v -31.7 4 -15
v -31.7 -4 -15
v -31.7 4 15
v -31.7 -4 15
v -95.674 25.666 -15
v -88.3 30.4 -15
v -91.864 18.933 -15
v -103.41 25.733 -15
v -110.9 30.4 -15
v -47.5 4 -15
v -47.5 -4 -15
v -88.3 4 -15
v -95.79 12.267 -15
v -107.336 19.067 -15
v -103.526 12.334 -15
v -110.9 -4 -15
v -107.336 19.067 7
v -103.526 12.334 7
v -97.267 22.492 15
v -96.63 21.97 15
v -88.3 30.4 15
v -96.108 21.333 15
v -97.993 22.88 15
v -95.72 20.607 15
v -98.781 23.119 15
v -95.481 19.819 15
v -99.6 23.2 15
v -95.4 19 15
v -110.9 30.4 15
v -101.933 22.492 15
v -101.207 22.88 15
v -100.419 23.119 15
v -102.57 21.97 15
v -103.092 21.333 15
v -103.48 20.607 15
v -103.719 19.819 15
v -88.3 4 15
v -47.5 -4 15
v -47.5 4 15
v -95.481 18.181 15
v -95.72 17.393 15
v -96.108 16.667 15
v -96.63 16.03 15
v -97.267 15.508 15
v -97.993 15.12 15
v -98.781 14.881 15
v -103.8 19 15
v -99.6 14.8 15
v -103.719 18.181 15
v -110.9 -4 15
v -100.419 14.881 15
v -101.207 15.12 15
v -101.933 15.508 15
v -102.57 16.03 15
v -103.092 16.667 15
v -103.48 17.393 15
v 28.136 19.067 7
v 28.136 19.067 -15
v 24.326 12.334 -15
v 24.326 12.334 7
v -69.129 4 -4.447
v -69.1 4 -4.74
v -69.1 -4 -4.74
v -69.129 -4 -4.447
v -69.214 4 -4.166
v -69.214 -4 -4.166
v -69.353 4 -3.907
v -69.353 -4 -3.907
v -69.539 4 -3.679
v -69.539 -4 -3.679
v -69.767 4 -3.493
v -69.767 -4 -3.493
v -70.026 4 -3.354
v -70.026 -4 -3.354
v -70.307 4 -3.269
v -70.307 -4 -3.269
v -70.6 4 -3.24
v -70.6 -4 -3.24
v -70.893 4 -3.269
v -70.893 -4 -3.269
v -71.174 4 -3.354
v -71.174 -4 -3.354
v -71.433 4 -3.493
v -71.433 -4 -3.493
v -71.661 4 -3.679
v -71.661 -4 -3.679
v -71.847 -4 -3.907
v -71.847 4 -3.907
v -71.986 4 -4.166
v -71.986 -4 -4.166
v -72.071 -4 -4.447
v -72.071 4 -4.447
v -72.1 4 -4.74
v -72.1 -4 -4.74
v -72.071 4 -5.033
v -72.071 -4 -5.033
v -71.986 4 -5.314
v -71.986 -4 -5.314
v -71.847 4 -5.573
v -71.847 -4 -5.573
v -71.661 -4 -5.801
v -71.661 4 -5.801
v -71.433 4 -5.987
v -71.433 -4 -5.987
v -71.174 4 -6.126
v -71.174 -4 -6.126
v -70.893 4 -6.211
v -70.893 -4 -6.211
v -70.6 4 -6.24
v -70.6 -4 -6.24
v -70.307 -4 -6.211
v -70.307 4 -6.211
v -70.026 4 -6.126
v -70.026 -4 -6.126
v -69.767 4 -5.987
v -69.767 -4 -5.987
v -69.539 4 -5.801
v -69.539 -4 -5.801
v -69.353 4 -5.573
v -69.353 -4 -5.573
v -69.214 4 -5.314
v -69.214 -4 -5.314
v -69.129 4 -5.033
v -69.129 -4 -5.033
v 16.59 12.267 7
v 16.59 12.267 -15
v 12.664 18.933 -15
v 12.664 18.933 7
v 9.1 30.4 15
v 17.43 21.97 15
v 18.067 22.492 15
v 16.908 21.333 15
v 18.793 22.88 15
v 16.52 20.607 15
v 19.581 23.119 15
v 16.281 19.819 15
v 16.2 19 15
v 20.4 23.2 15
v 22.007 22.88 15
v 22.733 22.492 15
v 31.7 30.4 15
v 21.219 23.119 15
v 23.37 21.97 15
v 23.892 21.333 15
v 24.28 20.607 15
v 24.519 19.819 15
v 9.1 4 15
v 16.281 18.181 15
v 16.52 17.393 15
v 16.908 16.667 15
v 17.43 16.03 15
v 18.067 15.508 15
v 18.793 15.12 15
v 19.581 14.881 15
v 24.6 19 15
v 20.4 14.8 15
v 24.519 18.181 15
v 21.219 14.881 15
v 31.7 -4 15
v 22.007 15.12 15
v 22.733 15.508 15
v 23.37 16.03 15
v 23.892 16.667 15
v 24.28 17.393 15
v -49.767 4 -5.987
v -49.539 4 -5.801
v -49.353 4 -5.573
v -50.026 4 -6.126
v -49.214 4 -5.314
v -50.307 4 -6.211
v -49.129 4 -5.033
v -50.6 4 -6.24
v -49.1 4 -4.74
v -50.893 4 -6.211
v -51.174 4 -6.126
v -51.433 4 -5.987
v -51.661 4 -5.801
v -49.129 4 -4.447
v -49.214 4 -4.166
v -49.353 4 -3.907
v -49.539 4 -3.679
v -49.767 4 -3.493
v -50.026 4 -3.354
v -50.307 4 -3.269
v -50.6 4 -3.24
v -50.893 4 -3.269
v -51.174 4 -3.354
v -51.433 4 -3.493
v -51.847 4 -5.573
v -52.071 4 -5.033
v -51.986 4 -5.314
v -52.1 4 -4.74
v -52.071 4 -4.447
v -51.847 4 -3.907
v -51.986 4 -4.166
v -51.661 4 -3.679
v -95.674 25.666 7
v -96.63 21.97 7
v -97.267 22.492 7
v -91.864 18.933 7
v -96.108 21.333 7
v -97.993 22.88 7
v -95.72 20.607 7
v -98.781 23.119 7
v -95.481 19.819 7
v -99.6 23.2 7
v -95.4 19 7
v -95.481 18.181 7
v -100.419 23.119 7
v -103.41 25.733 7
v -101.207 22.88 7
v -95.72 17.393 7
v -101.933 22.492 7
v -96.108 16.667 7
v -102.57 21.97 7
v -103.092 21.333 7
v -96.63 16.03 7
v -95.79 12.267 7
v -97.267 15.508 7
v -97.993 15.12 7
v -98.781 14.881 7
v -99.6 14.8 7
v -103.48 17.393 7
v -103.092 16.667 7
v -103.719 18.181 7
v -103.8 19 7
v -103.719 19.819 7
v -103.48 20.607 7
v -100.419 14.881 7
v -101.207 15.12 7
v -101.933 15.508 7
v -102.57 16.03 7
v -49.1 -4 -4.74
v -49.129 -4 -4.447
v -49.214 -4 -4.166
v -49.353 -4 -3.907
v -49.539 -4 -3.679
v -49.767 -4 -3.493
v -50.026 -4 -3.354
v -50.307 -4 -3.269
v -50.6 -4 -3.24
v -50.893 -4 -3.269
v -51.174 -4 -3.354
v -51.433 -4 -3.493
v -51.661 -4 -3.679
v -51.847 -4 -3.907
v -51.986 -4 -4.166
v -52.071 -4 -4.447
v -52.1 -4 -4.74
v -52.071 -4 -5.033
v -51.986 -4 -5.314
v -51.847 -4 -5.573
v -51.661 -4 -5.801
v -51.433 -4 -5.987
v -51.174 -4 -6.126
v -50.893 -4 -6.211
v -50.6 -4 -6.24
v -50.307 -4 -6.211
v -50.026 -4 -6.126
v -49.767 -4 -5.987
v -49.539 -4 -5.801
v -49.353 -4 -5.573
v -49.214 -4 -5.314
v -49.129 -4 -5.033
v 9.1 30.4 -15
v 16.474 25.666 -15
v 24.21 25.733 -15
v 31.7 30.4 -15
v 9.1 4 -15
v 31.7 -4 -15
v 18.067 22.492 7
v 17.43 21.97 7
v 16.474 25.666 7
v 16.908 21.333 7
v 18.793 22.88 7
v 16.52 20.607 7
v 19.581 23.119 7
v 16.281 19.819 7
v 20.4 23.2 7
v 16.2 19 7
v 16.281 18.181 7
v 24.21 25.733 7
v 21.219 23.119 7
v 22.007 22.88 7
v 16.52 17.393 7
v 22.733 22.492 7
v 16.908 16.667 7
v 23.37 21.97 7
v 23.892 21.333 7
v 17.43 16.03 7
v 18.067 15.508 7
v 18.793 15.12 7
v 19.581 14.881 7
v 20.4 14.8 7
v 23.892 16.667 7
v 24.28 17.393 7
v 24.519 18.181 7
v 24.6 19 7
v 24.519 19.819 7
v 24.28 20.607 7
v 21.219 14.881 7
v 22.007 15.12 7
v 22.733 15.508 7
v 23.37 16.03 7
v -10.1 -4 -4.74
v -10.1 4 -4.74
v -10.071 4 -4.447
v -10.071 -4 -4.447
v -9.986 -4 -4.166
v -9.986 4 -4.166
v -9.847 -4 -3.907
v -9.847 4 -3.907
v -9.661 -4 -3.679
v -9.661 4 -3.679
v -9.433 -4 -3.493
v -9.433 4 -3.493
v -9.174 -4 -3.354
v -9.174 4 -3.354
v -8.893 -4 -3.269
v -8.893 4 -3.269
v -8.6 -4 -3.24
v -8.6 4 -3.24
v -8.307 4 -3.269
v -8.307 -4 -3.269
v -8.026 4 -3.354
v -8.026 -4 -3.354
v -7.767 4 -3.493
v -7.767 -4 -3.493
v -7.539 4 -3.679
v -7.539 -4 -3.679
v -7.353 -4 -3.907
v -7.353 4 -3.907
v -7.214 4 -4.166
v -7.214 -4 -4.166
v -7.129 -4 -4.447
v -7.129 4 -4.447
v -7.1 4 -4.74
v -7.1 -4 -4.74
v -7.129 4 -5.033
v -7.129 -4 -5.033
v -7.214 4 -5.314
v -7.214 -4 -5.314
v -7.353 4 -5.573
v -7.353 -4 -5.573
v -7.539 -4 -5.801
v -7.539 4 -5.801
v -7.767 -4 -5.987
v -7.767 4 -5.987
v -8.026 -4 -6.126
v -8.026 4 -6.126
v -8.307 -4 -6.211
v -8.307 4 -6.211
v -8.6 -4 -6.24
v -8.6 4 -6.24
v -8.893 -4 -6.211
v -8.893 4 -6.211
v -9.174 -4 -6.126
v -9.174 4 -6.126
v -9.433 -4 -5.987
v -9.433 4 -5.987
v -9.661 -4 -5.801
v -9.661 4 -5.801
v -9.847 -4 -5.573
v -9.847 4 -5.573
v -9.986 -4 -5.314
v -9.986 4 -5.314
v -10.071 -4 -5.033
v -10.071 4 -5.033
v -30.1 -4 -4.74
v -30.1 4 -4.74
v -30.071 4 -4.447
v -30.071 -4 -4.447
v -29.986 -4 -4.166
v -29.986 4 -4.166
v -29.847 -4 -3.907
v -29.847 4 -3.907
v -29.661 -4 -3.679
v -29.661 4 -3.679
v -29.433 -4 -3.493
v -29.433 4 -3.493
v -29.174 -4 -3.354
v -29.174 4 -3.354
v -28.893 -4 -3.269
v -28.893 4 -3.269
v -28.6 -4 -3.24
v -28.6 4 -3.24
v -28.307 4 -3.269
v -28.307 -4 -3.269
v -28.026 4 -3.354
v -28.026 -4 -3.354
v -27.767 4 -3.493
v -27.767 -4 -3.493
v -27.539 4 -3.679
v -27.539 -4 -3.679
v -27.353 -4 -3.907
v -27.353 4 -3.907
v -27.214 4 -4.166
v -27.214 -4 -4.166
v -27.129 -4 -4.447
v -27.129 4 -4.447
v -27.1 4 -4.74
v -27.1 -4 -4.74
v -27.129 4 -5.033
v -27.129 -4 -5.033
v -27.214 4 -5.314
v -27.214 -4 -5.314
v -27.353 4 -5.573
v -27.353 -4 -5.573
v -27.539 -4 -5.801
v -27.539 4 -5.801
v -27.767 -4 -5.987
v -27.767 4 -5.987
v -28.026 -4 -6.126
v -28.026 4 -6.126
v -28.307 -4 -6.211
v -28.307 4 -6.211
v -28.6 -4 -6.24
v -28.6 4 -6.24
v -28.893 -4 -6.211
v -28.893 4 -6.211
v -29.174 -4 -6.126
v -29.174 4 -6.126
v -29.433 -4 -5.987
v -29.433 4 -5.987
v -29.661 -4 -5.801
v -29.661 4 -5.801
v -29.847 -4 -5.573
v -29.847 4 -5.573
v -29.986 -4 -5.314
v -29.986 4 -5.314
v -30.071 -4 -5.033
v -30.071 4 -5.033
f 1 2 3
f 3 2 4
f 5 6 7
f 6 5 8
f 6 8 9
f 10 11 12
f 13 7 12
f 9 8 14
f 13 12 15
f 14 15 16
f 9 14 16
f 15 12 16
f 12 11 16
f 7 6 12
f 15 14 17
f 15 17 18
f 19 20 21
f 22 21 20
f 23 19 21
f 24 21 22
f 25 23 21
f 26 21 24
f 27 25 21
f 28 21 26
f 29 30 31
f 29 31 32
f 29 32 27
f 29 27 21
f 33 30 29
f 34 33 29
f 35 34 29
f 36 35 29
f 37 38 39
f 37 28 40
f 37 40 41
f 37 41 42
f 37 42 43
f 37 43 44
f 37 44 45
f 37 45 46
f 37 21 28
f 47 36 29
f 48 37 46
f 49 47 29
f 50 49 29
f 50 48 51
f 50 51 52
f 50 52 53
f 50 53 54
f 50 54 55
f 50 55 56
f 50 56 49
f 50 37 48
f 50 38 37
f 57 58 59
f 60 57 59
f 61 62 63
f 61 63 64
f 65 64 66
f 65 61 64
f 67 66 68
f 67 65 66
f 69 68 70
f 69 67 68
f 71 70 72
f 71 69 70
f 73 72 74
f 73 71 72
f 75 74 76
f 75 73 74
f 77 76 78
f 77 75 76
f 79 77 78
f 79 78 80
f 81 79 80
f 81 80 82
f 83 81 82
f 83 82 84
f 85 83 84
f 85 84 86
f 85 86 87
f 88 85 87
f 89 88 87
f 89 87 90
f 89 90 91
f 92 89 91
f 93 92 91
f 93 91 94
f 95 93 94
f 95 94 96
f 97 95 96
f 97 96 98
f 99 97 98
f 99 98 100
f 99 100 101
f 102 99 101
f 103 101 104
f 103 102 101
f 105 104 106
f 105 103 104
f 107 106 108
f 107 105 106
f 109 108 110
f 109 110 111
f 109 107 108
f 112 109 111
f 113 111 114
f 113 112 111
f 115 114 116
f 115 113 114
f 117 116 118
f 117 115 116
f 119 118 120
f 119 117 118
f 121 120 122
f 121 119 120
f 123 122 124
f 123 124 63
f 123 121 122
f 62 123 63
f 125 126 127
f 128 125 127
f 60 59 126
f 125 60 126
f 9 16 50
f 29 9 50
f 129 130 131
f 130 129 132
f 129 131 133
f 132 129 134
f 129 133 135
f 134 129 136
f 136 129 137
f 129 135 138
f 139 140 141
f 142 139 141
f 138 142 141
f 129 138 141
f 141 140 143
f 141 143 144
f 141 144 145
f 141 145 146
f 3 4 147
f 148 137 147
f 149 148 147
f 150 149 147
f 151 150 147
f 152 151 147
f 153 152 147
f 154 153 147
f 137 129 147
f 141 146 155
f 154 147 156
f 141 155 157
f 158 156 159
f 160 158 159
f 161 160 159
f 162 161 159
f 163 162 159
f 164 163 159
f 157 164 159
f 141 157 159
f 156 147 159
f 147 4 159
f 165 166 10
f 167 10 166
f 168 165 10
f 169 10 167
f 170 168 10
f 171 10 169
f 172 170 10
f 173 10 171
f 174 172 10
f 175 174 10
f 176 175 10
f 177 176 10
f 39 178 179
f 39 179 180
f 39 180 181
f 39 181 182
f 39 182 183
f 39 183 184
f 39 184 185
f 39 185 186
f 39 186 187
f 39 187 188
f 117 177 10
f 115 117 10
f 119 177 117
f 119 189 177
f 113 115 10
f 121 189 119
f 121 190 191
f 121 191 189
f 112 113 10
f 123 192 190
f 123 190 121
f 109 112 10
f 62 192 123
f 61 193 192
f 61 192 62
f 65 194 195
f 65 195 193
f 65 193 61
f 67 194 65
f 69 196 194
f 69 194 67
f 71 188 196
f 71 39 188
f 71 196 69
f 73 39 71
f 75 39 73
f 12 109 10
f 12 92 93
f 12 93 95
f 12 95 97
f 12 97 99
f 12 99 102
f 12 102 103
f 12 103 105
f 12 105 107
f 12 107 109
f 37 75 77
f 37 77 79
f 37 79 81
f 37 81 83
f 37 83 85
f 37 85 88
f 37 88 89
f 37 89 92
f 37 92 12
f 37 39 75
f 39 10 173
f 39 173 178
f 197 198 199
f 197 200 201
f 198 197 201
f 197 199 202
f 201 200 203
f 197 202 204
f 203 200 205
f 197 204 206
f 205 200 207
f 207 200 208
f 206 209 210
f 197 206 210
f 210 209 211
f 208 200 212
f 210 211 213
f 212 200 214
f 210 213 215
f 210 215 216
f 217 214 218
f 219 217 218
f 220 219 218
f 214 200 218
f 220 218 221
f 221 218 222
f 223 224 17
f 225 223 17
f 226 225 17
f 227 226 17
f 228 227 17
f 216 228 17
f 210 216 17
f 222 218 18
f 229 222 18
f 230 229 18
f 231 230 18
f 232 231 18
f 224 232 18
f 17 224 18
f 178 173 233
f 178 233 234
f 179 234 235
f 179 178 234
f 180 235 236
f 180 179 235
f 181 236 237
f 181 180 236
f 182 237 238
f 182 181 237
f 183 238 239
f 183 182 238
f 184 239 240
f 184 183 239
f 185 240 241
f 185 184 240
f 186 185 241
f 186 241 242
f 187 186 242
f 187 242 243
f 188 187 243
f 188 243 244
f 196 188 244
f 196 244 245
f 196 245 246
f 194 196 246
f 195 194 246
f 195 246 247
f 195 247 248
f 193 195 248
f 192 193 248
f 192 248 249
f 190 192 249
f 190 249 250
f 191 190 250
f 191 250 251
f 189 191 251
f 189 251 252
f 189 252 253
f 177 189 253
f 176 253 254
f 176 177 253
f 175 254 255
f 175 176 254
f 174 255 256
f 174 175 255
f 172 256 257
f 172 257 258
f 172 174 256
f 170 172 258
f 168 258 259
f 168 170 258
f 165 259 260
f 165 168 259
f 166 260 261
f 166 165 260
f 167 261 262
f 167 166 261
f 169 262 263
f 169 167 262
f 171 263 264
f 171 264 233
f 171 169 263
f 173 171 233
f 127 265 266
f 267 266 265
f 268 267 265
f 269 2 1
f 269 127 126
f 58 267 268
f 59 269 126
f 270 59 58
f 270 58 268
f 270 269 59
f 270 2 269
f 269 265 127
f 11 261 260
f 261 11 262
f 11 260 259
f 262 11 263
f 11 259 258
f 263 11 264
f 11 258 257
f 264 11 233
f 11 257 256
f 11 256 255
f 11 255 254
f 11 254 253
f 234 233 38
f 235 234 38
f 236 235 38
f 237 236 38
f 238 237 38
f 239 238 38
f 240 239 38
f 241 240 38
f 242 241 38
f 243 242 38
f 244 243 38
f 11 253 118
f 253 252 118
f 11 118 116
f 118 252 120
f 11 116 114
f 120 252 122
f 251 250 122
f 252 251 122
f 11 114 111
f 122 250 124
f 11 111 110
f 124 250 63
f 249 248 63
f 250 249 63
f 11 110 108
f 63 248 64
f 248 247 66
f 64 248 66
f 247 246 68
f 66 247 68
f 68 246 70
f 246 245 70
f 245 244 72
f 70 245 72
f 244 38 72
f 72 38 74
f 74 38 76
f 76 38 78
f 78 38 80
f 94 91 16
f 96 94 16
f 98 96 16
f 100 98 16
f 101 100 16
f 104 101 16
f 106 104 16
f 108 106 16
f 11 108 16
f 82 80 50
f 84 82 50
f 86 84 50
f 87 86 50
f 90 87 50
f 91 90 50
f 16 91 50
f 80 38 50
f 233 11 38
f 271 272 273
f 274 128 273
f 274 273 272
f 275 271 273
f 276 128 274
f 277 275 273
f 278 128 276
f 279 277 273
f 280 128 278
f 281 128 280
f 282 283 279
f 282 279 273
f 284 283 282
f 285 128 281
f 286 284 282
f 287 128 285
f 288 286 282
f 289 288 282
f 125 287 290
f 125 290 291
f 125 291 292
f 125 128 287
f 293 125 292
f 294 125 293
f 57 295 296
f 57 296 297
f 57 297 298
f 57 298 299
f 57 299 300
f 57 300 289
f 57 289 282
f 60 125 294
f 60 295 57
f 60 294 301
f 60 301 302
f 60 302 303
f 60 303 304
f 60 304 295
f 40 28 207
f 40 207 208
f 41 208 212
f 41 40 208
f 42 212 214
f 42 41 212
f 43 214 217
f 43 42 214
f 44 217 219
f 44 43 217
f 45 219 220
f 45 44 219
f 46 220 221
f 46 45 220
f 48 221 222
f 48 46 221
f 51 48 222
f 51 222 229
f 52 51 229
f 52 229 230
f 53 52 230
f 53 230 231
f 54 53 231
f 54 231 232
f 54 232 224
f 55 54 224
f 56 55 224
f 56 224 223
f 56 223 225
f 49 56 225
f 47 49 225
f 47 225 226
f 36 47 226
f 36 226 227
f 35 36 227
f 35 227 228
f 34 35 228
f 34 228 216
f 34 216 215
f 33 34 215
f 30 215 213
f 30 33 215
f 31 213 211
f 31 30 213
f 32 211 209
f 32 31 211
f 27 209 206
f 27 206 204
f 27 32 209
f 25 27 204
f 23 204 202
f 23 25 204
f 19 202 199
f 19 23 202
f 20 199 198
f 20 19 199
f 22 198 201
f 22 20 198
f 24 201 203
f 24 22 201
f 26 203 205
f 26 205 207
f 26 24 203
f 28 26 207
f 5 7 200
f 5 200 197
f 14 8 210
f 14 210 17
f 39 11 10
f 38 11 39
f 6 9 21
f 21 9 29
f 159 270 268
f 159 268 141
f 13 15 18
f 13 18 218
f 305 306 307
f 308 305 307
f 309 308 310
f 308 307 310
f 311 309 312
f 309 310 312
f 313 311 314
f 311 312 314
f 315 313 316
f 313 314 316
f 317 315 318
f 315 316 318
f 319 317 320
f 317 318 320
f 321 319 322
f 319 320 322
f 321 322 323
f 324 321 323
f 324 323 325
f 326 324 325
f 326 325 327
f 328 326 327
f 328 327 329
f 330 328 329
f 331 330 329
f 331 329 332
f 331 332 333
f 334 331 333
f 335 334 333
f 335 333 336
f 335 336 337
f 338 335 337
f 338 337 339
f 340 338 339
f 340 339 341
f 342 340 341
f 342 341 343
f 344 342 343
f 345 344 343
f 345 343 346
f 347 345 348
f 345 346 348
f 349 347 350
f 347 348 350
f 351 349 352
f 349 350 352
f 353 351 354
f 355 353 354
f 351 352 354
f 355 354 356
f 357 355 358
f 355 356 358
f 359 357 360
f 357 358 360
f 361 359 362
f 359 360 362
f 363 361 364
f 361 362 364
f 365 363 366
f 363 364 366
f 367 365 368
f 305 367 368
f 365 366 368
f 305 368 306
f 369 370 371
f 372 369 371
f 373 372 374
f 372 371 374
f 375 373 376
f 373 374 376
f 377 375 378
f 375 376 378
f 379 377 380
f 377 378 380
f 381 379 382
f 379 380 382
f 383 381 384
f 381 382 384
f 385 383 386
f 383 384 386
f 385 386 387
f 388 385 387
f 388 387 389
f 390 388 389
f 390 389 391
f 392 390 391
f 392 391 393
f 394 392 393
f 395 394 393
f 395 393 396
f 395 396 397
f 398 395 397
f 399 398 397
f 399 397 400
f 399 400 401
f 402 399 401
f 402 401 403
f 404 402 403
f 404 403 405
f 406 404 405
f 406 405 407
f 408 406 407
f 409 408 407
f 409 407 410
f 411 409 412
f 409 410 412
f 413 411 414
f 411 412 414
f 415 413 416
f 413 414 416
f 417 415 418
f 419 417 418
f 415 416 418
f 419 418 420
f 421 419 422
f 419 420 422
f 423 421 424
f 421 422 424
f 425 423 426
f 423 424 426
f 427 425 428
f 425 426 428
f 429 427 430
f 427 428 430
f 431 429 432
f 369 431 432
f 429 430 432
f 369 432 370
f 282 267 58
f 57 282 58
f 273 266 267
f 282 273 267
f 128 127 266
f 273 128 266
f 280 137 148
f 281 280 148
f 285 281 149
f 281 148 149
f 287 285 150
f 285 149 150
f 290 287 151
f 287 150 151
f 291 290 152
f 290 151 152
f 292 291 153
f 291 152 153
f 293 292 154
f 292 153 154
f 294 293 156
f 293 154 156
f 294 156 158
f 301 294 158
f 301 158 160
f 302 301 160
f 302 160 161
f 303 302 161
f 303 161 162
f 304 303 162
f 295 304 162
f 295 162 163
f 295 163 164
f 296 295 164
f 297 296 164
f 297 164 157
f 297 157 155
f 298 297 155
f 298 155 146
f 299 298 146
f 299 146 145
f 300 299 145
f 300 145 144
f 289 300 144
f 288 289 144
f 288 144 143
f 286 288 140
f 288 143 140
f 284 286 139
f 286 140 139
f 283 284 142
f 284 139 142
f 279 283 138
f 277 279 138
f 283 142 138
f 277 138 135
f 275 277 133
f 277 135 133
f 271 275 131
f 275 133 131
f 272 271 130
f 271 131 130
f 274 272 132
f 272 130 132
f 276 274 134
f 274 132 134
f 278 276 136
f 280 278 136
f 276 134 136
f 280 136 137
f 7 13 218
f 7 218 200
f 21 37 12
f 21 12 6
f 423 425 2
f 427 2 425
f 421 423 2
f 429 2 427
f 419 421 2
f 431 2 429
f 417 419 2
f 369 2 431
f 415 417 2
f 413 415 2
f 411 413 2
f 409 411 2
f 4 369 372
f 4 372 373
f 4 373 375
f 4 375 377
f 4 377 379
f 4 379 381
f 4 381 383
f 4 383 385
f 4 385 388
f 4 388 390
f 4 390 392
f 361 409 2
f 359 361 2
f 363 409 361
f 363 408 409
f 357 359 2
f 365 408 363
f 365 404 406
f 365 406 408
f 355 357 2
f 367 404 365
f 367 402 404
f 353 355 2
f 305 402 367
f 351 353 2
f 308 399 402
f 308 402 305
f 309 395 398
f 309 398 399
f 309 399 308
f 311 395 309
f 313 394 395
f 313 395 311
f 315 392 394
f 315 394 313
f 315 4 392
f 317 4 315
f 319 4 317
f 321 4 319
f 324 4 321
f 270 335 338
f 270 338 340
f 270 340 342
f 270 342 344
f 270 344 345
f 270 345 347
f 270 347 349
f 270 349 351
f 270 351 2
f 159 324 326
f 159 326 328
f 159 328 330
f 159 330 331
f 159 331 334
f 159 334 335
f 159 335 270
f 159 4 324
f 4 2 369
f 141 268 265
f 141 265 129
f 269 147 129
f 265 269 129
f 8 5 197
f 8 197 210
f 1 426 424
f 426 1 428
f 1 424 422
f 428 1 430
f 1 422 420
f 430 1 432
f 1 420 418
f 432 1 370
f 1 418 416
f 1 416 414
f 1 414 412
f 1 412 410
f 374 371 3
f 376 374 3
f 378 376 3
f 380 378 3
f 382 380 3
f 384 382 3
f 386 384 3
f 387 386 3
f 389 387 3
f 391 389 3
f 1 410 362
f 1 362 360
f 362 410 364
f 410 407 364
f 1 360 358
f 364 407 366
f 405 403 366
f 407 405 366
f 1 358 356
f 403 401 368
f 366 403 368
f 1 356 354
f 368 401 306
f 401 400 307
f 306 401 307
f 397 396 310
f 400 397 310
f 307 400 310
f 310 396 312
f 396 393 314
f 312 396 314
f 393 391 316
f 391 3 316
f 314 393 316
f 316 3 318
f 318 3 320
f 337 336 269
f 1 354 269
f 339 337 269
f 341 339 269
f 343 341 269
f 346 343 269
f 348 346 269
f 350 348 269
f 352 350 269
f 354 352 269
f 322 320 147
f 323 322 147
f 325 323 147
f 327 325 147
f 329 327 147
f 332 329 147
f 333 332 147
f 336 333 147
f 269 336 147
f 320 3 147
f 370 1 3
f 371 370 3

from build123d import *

# Parameters (mm, degrees)
F0_W      = 63.4
F0_H      = 30
F1_DEPTH  = 4
F3_D      = 3
F5_W      = 34.4
F5_H      = 30
F6_DEPTH  = 11.3
F10_D     = 8.4
F11_R     = 4.2
F12_DEPTH = 22


with BuildPart() as f1:
    # F0 (on Front) → F1 (new body, symmetric)
    with BuildSketch(Plane.XZ):
        Rectangle(F0_W, F0_H)
    extrude(amount=F1_DEPTH, both=True)

    # F3 (through all)
    with Locations(Plane.XZ.offset(4)):
        with Locations((-28.6, -4.74), (-8.6, -4.74)):
            Hole(F3_D / 2)

    # F5 (on plane+point) → F6 (join, symmetric)
    with BuildSketch(Plane.YZ.offset(20.4)):
        with Locations((13.2, 0)):
            Rectangle(F5_W, F5_H)
    extrude(amount=F6_DEPTH, both=True)

    # F10 (through all)
    with Locations(Plane(origin=(0, 0, -15), x_dir=(1, 0, 0), z_dir=(0, 0, -1))):
        with Locations((20.4, -19)):
            Hole(F10_D / 2)

    # F11 (on face) → F12 (cut)
    with BuildSketch(Plane(origin=(0, 0, -15), x_dir=(1, 0, 0), z_dir=(0, 0, -1))):
        Polygon((12.6637970472, -18.9329387911), (16.4738218131, -25.6662176815), (24.2100247659, -25.7332788904), (28.1362029528, -19.0670612089), (24.3261781869, -12.3337823185), (16.5899752341, -12.2667211096), align=None)
        with Locations((20.4, -19)):
            Circle(F11_R, mode=Mode.SUBTRACT)
    extrude(amount=-F12_DEPTH, mode=Mode.SUBTRACT)


with BuildPart() as f14_1:
    # F14: instance of F1
    add(f1.part.mirror(Plane.YZ.offset(-39.6)))


solid = Compound([f1.part, f14_1.part])
